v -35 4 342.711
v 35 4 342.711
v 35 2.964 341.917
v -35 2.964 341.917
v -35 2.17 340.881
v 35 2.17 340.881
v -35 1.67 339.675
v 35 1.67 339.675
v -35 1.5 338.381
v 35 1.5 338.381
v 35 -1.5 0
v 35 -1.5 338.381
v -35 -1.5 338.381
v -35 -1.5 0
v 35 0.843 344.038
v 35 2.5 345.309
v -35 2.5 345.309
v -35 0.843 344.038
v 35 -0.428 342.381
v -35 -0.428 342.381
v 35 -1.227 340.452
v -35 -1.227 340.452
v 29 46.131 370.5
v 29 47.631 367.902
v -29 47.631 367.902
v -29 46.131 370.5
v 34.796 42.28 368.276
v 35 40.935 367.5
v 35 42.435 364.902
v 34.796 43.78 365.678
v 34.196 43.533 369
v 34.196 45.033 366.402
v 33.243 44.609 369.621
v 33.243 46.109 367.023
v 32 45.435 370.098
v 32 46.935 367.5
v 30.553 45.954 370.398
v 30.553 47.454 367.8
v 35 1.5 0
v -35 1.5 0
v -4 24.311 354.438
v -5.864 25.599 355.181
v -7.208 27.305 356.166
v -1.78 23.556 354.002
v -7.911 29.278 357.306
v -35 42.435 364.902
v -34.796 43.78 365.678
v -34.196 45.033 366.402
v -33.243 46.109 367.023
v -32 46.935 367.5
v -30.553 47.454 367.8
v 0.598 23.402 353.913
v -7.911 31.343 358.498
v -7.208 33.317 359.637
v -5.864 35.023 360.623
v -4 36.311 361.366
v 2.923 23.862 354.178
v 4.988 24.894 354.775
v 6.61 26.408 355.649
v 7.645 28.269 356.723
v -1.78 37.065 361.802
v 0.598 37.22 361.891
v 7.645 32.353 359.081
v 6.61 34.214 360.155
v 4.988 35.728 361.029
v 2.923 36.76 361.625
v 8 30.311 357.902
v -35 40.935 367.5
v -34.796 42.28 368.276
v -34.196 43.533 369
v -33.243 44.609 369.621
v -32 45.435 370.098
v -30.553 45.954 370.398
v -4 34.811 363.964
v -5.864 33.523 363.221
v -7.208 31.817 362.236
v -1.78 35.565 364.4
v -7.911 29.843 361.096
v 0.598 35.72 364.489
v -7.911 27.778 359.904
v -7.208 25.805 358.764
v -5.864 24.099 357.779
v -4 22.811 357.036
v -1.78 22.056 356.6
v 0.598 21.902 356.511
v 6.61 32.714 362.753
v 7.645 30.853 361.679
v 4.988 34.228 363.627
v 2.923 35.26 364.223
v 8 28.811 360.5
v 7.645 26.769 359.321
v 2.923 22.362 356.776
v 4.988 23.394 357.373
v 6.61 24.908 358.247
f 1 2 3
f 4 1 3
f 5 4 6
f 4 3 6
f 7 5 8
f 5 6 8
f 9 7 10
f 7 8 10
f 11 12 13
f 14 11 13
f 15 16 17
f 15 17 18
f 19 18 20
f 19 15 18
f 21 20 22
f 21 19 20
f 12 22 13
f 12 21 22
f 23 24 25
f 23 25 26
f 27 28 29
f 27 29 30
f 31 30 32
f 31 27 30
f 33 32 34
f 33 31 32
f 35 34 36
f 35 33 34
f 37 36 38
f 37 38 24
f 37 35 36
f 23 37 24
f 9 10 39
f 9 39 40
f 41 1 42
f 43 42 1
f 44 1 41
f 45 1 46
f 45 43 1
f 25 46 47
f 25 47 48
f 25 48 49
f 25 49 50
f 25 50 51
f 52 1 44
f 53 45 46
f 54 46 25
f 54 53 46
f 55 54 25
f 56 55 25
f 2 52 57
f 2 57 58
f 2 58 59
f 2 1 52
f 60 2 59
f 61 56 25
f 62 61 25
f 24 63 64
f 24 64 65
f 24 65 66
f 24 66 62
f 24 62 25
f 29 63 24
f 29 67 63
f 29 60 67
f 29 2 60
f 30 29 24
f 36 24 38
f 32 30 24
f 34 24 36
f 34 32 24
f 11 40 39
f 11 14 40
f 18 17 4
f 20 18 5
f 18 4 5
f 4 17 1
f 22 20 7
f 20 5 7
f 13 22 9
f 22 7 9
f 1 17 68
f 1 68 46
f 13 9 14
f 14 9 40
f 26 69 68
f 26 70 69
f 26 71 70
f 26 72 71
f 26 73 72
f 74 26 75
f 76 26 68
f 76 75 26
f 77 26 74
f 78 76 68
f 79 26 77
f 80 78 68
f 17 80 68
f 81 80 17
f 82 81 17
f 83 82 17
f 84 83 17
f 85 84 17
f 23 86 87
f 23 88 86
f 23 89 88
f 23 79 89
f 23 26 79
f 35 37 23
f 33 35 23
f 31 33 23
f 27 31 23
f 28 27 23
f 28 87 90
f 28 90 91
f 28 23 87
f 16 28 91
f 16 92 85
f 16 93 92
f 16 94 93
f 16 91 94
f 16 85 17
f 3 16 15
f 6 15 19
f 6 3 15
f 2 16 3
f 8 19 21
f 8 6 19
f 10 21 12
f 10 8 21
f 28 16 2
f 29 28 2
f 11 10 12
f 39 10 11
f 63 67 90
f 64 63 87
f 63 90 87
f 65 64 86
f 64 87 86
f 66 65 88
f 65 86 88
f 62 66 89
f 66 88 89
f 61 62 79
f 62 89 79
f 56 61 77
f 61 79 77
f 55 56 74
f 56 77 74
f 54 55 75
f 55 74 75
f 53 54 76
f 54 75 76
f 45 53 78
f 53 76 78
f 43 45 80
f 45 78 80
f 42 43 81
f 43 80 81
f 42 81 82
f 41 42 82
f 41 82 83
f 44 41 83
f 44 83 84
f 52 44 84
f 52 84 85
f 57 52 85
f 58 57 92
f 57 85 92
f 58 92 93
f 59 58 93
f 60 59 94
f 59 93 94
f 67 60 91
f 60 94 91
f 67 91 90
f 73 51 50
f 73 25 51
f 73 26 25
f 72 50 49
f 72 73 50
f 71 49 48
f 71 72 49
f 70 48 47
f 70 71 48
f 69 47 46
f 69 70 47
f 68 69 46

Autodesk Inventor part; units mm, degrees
ref_plane "YZ Plane" through (0, 0, 0) normal (1, 0, 0) x (0, 1, 0)
ref_plane "XZ Plane" through (0, 0, 0) normal (0, 1, 0) x (-1, 0, 0)
ref_plane "XY Plane" through (0, 0, 0) normal (0, 0, 1) x (1, 0, 0)
sketch "Sketch1" plane through (0, 0, 0) normal (0, 1, 0) x (-1, 0, 0)
  line L0 (35, 0) -> (-35, 0)
  line L1 (-35, 0) -> (-35, 343)
  line L2 (-35, 343) -> (35, 343)
  line L3 (35, 343) -> (35, 0)
  point P0 (0, 0)
  point P1 (0, 0)
  point P2 (0, 0)
  dimension "d7" = 70
  dimension "d8" = 343
extrude "Plate1" add sketch "Sketch1" along normal mid plane 3
sketch "Sketch2" plane through (35, 0, 340.4019) normal (0, -0.5, 0.8660254) x (1, 0, 0)
  line L0 (-70, 0) -> (0, 0)
  line L1 (0, 0) -> (0, 55)
  line L2 (0, 55) -> (-70, 55)
  line L3 (-70, 55) -> (-70, 0)
edge flange "Flange1" height 55 angle 60 thickness 3 bend radius 5 thickness toward (0, -0.5, 0.8660254) relief round relief width 3 relief depth 1.5 edges at (0, 1.5, 343) wall of the first edge with corners at (-35, 0, 340.4019) (35, 0, 340.4019) (35, 47.6314, 367.9019) (-35, 47.6314, 367.9019)
bend "Bend1"
corner "Corner1"
sketch "Sketch3" plane through (-35, 46.1314, 370.5) normal (0, -0.5, 0.8660254) x (1, 0, 0)
  circle A0 centre (35, -20) radius 8
  line L0 (0, 0) -> (70, 0) projected
  point P0 (35, -225.201)
  point P1 (35, 0)
  dimension "d19" = 20
  dimension "d20" = 16
extrude "Cut1" cut sketch "Sketch3" against normal blind 3
fillet "Corner Round1" radius 6 2 edges at (35, 46.8814, 369.201) (-35, 46.8814, 369.201)
equation "\"d21\" = Thickness"
equation "\"d6\" = Thickness"
equation "\"d9\" = BendReliefWidth"
equation "\"d10\" = BendReliefDepth"
equation "\"d11\" = MinimumRemnant"
equation "\"d12\" = TransitionRadius"
equation "\"d15\" = BendRadius"
equation "\"d16\" = CornerReliefSize"
equation "\"d17\" = GapSize"
equation "\"d18\" = JacobiRadiusSize"
equation "\"BendReliefWidth\" = Thickness"
equation "\"BendReliefDepth\" = 0.5 * Thickness"
equation "\"CornerReliefSize\" = 4 * Thickness"
equation "\"MinimumRemnant\" = 2 * Thickness"
equation "\"TransitionRadius\" = BendRadius"
equation "\"JacobiRadiusSize\" = BendRadius"
equation "\"GapSize\" = Thickness"
equation "\"Thickness\" = 3"
equation "\"BendRadius\" = 5"
properties part number "MSC 202 GRID CORNER" material "Stainless Steel"
